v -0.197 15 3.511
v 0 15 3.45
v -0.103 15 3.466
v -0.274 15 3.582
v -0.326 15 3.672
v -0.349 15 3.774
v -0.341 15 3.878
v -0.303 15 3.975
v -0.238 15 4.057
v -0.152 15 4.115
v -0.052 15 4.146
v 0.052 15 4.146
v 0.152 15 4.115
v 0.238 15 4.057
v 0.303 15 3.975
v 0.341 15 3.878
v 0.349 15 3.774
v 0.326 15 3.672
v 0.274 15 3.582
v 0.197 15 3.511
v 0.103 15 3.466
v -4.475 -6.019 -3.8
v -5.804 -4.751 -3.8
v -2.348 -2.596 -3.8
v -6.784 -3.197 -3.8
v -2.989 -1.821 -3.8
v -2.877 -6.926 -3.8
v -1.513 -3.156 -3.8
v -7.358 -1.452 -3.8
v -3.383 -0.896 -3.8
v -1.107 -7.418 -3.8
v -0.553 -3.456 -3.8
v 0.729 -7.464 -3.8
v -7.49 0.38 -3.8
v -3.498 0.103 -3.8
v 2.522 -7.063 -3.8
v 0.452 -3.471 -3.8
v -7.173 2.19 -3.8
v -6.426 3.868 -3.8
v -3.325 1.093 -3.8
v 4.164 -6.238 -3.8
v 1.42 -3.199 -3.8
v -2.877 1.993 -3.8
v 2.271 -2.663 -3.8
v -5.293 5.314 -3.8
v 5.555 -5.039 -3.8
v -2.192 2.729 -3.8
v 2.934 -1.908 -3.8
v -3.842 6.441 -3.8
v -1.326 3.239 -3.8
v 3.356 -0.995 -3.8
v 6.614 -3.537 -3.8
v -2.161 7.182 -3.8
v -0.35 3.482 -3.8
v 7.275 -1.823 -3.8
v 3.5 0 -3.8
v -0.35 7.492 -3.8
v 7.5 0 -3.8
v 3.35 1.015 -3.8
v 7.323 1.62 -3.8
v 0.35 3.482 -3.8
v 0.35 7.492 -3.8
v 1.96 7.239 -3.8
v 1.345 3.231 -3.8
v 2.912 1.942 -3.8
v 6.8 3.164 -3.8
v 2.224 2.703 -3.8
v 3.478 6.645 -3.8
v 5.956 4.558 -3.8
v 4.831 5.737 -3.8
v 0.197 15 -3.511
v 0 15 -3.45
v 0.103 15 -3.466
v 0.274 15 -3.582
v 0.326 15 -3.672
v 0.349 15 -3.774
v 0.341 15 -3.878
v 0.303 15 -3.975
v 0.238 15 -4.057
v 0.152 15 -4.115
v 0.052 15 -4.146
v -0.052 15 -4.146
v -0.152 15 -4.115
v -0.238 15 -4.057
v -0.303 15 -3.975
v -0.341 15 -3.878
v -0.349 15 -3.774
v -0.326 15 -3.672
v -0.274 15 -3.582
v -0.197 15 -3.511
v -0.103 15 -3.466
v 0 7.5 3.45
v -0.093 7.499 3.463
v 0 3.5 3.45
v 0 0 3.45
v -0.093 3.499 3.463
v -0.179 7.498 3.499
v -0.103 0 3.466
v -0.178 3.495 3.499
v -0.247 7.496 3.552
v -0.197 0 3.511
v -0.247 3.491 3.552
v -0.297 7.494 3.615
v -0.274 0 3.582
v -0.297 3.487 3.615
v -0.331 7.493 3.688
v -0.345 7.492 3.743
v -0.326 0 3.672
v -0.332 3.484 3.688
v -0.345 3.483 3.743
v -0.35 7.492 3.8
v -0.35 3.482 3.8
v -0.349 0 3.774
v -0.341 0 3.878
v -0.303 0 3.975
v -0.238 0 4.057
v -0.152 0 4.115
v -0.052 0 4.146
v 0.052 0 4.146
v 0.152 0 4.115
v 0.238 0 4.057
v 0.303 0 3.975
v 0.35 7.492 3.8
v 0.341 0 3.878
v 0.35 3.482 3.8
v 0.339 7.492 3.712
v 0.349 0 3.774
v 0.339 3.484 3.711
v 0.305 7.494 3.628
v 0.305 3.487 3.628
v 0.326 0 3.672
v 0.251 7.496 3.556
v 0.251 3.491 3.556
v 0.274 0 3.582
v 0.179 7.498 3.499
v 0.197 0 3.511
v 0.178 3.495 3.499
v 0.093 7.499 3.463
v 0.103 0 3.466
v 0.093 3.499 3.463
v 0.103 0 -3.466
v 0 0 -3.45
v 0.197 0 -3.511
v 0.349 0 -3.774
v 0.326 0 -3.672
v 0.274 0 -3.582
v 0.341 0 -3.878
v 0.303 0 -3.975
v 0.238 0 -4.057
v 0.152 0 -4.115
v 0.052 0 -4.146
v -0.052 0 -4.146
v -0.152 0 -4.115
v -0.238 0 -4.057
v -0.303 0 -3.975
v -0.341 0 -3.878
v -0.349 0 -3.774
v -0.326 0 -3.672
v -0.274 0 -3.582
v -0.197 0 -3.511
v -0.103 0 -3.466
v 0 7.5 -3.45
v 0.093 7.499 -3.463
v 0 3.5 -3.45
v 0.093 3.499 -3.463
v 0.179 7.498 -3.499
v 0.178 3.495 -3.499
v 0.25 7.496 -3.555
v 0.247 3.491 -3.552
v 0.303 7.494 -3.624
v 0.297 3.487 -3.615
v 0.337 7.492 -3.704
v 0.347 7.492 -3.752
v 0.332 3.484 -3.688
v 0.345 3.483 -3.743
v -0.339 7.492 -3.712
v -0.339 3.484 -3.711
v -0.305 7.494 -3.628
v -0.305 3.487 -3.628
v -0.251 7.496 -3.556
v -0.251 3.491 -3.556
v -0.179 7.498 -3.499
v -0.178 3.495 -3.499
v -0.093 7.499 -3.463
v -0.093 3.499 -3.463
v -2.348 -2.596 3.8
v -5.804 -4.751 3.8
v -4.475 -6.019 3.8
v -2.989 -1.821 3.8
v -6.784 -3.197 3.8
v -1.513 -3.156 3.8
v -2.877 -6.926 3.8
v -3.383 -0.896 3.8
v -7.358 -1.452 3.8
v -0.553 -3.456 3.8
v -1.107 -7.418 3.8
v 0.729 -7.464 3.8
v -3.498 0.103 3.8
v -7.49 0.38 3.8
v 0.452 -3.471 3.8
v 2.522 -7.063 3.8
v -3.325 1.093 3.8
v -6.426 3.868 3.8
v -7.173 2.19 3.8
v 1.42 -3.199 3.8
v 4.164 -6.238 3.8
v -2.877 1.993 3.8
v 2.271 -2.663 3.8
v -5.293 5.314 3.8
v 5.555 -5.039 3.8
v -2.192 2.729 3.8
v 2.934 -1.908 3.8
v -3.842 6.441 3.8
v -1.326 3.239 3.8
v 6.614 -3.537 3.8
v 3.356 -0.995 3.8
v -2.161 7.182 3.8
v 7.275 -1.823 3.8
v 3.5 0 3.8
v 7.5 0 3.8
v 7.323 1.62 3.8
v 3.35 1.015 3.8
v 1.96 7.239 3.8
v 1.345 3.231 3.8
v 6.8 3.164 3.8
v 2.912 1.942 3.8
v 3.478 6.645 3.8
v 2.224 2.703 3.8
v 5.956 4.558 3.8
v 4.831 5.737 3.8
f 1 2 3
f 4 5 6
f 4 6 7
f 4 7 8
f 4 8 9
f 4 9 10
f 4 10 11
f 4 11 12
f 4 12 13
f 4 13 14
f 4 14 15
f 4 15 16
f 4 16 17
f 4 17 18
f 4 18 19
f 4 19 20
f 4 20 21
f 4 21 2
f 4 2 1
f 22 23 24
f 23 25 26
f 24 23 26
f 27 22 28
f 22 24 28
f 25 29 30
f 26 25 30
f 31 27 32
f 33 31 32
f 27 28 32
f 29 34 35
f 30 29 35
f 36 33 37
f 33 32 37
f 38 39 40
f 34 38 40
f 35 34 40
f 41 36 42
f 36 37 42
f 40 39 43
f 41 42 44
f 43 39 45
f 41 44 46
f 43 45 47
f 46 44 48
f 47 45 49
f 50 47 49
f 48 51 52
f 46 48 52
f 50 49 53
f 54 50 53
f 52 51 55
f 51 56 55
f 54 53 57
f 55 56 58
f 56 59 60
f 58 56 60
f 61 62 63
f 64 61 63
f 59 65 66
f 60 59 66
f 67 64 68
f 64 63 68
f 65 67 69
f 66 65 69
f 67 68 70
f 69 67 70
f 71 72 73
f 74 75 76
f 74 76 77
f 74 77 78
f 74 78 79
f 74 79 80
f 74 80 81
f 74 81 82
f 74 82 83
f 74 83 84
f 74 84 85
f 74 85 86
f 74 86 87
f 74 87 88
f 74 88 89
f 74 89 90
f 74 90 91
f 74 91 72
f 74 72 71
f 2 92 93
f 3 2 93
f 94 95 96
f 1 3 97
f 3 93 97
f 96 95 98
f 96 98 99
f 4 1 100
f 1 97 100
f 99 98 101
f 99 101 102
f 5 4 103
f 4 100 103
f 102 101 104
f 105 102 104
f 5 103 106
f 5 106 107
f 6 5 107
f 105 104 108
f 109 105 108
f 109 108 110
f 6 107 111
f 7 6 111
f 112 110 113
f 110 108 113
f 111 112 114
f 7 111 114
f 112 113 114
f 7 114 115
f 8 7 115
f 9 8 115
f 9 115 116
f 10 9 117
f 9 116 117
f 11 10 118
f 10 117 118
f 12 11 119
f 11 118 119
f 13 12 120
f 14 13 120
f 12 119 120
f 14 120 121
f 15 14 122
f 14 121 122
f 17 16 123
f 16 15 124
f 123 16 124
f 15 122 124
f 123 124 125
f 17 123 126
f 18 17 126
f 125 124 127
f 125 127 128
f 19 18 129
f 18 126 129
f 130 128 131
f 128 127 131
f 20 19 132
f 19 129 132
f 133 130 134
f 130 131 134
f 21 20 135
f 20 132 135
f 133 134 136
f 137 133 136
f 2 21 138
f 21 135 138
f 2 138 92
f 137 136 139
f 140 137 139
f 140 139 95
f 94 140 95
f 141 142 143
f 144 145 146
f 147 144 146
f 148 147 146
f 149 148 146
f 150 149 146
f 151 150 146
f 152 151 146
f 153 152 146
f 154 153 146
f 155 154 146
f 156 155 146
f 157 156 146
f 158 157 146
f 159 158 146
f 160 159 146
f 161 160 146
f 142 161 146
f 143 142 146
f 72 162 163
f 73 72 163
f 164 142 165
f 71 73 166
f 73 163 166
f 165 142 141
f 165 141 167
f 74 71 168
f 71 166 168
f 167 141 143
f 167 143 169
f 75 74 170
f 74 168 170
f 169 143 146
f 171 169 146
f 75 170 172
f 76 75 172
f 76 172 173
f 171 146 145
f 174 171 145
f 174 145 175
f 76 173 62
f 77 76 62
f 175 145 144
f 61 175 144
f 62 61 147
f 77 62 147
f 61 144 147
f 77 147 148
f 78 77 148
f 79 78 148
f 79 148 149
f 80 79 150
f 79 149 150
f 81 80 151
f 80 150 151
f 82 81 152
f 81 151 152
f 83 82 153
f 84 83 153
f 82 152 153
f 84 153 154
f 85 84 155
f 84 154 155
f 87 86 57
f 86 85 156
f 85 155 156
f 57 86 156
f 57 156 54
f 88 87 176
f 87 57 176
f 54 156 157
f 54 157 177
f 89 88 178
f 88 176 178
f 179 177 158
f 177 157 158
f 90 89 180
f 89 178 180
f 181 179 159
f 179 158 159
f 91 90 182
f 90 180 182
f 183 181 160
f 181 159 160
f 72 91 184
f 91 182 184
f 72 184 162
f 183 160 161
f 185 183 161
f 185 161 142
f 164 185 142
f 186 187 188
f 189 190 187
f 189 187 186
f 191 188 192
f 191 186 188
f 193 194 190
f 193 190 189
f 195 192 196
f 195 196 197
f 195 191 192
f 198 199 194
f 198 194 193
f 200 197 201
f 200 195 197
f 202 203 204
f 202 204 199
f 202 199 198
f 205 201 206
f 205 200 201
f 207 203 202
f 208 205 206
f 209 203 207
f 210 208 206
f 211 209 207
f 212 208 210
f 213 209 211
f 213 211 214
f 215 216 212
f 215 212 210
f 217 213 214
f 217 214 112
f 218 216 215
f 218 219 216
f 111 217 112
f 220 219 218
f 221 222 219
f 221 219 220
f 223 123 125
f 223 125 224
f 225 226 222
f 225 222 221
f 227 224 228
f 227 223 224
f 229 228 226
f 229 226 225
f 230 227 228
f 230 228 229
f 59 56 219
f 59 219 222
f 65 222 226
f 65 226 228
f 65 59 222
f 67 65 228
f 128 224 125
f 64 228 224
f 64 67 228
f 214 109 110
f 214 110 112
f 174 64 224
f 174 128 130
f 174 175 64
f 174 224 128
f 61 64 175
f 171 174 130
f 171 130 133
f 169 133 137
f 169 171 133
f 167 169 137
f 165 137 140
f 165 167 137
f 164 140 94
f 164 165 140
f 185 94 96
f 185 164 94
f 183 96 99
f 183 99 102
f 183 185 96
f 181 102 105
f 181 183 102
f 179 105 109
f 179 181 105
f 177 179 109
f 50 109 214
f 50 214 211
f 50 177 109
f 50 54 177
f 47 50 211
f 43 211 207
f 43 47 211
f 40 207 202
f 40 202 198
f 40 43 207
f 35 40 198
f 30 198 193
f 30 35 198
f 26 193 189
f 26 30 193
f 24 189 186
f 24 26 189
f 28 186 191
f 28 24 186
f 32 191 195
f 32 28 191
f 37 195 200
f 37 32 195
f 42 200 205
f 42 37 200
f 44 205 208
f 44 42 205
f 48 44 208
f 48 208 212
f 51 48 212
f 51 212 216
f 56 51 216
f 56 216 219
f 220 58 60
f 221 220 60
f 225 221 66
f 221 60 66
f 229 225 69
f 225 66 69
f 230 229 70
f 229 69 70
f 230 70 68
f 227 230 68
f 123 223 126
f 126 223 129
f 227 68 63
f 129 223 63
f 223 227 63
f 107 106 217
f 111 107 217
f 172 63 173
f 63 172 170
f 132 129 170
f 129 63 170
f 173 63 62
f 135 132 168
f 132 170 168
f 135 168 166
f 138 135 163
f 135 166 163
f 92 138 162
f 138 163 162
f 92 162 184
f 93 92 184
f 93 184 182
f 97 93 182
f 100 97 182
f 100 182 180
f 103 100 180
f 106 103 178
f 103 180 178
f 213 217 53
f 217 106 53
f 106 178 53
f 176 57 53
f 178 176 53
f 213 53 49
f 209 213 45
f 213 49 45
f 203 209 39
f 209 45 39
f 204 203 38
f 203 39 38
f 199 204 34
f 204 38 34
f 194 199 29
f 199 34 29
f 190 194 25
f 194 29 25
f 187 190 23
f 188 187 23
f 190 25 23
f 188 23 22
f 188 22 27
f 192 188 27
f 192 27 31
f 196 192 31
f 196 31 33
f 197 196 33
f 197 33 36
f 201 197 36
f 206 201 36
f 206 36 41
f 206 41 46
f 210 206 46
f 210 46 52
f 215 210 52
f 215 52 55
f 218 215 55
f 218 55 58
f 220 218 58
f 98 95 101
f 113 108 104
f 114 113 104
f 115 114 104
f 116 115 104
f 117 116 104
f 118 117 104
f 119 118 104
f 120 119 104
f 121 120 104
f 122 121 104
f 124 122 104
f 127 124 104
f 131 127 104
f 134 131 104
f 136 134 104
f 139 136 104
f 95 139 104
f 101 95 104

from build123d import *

# Parameters (mm, degrees)
EXTRUDE_1_DEPTH      = 3.8
EXTRUDE_1_DEPTH_BACK = 3.8
SKETCH_1_R           = 7.5
SKETCH_1_R_2         = 3.5
SKETCH_3_R           = 0.35
EXTRUDE_2_DEPTH      = 15


with BuildPart() as part:
    # 草图1 → 凸台-拉伸1 (new, two sides: drawn at the far end of the back side and taken through both)
    with BuildSketch(Plane.XY.offset(-EXTRUDE_1_DEPTH_BACK)):
        Circle(SKETCH_1_R)
        Circle(SKETCH_1_R_2, mode=Mode.SUBTRACT)
    extrude(amount=EXTRUDE_1_DEPTH + EXTRUDE_1_DEPTH_BACK)

    # 草图3 → 凸台-拉伸2 (add)
    with BuildSketch(Plane(origin=(0, 0, 0), x_dir=(1, 0, 0), z_dir=(0, 1, 0))):
        with Locations((0, 3.8)):
            Circle(SKETCH_3_R)
        with Locations((0, -3.8)):
            Circle(SKETCH_3_R)
    extrude(amount=EXTRUDE_2_DEPTH)


solid = part.part
